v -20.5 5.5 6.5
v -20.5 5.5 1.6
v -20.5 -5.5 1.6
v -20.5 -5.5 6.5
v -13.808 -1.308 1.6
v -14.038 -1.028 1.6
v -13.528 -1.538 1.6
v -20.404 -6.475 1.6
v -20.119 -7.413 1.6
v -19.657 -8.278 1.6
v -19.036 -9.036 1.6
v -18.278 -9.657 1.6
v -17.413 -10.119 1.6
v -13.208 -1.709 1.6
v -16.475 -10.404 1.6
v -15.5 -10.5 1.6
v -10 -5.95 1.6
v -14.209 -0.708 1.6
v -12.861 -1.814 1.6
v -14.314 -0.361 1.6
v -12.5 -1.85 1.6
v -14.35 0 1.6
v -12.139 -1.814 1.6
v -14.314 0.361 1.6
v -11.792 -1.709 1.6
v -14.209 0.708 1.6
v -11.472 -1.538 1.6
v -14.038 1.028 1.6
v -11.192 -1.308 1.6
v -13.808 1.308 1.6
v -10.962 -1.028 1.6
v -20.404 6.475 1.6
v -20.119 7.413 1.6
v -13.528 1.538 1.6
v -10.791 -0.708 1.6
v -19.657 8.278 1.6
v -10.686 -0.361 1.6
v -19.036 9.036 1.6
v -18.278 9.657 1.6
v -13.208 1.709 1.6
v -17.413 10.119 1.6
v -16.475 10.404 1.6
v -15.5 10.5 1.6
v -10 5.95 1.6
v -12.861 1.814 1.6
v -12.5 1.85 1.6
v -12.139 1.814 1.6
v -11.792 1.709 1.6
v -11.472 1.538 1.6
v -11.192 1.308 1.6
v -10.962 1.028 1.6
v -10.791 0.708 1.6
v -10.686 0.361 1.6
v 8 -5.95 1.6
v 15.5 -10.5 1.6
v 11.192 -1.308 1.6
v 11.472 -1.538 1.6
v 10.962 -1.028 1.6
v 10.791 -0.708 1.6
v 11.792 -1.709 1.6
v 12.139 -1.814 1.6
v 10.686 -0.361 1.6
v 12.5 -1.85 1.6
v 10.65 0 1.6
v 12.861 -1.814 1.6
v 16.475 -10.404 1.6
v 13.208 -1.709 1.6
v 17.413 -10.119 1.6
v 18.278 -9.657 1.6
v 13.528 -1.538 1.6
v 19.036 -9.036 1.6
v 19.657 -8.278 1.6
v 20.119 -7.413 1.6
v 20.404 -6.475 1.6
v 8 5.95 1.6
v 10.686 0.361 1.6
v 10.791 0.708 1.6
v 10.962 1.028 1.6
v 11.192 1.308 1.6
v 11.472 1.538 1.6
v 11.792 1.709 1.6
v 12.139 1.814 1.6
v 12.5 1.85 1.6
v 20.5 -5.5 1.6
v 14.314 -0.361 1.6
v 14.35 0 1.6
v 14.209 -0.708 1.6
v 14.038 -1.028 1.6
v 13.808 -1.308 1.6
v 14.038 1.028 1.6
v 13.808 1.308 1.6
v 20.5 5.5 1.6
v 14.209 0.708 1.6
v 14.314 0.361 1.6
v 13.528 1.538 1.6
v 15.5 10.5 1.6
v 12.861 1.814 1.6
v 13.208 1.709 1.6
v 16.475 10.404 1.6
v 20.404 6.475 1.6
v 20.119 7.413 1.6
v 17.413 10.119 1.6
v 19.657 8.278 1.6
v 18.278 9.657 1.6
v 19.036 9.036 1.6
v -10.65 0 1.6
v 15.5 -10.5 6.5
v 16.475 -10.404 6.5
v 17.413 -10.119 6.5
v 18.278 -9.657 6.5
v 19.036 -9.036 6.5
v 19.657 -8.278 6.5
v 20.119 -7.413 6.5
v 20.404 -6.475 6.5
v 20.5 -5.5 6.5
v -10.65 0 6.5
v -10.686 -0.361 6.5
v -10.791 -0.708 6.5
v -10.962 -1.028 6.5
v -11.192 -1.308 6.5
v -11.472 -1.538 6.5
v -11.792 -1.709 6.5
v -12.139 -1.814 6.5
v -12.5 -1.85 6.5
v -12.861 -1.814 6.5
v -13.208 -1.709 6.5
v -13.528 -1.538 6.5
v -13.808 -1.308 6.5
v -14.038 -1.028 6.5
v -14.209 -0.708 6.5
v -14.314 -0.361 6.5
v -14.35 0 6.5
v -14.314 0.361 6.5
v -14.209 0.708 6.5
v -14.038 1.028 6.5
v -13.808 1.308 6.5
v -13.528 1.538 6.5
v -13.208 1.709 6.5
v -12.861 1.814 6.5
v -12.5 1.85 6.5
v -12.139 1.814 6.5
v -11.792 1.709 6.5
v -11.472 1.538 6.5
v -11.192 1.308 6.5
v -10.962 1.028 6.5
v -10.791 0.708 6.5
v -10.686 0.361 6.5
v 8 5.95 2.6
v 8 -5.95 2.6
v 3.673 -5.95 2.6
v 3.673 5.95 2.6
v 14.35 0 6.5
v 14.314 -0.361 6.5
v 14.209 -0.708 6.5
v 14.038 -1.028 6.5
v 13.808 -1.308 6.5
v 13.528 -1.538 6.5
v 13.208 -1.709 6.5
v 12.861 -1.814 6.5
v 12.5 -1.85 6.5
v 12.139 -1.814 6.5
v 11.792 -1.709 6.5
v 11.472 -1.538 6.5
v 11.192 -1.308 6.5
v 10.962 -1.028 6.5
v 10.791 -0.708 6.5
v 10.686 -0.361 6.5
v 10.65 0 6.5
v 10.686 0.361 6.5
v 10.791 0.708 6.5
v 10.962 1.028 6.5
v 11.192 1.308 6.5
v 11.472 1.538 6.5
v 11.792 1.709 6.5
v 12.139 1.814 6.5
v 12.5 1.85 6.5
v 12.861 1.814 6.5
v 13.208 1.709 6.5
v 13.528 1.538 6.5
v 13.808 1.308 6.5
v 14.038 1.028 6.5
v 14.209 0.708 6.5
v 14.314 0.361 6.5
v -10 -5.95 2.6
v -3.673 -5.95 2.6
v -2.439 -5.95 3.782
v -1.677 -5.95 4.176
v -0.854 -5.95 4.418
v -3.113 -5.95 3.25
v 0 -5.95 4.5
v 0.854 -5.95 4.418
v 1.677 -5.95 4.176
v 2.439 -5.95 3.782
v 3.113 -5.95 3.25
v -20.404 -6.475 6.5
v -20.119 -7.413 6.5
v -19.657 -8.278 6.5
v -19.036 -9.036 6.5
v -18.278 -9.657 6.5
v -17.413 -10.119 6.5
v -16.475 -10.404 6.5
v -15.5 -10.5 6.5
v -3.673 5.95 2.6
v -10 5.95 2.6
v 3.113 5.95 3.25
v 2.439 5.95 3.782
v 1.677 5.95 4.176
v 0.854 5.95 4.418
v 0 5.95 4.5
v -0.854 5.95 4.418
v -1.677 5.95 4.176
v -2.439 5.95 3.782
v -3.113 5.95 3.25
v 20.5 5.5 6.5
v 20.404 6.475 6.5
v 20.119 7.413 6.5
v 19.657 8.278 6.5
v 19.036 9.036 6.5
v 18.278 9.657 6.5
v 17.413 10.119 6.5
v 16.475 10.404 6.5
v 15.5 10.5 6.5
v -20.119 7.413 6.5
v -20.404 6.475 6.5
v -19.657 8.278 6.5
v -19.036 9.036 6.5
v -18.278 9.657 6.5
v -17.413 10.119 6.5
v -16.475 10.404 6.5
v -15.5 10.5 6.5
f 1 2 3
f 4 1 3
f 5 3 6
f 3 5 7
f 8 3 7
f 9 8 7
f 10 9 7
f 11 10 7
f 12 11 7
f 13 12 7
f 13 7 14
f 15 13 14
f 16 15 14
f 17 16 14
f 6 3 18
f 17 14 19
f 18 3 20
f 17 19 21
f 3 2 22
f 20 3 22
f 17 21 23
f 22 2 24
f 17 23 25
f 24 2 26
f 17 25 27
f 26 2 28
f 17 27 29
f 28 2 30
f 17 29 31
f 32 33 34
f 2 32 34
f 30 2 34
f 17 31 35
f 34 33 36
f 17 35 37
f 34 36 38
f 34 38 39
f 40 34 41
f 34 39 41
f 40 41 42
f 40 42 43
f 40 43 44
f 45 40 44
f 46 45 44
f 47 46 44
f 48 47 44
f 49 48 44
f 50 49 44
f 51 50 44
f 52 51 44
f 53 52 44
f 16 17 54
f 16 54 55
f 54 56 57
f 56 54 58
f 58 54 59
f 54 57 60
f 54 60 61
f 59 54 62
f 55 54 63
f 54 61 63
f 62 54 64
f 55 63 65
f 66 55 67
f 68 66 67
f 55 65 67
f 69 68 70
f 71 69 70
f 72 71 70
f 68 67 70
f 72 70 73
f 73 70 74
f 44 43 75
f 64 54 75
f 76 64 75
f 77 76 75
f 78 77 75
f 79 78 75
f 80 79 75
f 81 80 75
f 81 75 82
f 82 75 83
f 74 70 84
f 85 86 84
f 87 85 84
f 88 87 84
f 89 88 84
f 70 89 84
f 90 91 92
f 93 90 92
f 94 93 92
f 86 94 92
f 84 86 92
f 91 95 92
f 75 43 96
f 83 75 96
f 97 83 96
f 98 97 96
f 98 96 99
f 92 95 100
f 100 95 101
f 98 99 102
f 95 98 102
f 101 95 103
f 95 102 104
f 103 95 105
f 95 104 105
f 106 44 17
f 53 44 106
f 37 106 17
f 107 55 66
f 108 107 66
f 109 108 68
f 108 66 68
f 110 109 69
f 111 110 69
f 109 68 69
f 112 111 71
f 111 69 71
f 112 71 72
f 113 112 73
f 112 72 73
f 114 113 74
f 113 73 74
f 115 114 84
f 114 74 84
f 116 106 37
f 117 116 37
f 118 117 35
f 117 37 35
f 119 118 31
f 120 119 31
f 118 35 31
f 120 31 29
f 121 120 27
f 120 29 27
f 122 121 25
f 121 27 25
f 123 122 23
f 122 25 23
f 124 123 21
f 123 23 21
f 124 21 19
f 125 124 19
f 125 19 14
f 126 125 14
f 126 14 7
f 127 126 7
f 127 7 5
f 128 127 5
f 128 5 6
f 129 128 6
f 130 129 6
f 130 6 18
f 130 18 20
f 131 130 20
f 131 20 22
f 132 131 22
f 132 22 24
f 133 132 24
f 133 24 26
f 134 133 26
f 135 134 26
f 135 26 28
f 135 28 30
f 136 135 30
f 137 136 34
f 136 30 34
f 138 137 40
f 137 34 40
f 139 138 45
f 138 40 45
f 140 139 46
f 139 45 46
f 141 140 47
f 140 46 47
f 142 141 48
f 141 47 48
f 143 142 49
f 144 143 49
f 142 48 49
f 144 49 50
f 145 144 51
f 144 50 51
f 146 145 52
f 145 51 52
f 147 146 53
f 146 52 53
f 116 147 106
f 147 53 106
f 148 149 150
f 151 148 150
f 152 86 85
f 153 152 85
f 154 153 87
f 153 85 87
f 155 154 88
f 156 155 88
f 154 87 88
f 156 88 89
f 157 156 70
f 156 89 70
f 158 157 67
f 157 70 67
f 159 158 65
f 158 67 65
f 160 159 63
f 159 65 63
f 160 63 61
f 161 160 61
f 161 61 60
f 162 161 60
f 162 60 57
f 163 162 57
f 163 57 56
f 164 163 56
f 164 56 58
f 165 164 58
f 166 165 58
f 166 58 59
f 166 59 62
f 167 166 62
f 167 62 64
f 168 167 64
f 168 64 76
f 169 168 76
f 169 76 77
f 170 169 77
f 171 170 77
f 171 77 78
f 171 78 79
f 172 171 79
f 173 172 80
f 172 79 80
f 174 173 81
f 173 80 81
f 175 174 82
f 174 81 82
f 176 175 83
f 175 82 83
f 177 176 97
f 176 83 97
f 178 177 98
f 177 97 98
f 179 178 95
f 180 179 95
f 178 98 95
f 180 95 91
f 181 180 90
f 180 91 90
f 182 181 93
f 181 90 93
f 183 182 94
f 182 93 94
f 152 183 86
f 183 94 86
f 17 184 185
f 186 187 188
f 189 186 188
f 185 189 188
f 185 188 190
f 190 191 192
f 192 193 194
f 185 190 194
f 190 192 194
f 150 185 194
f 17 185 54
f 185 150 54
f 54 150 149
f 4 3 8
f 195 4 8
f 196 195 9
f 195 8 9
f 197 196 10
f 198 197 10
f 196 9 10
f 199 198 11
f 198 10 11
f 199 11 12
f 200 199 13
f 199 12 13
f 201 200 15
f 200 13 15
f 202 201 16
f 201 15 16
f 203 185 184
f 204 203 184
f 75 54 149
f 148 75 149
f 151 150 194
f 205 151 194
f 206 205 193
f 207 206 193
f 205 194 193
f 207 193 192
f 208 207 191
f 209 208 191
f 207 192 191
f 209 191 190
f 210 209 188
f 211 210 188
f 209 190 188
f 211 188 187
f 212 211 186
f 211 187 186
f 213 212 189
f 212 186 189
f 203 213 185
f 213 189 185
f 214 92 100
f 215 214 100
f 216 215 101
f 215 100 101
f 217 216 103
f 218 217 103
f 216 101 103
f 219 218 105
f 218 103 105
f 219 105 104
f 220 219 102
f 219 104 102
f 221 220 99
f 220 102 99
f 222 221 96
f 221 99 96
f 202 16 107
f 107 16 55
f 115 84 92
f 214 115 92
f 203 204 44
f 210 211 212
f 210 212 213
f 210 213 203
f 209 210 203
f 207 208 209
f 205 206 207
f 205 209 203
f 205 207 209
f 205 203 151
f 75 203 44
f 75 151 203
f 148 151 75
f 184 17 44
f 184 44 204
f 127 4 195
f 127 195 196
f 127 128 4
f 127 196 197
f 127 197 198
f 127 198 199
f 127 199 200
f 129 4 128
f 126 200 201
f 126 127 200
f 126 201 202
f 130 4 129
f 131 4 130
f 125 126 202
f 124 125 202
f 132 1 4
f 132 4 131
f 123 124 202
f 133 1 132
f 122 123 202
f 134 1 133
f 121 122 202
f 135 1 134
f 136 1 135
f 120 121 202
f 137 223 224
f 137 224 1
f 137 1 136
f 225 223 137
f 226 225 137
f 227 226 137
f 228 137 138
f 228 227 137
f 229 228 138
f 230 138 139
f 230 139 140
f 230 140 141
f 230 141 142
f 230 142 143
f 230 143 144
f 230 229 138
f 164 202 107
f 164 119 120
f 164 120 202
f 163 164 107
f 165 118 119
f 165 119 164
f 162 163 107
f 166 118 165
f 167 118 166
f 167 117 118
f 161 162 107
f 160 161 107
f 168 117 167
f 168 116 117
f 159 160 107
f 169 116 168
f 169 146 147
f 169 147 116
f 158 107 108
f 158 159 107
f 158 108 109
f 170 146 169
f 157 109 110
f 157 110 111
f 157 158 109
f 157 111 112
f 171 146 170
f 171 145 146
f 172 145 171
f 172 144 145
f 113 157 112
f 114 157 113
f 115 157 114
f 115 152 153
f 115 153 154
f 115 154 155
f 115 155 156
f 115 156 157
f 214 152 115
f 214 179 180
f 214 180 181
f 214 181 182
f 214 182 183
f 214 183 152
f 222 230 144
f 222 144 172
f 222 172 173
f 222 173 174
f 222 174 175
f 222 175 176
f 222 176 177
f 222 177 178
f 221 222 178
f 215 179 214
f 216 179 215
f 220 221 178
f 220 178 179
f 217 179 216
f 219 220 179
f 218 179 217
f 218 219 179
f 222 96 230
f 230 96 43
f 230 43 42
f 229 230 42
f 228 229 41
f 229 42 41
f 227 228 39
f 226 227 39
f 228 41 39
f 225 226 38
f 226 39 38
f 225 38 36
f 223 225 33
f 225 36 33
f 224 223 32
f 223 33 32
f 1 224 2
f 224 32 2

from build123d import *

# Parameters (mm, degrees)
F2_START = 1.6
F2_DEPTH = 4.9
F3_W     = 2
F3_H     = 5.2
F4_DEPTH = 5.95
F5_W     = 13
F5_H     = 3
F6_DEPTH = 12.5
F7_R     = 1.85
F8_DEPTH = 6


with BuildPart() as f2:
    # F1 (on Top) → F2 (new body)
    with BuildSketch(Plane.XY.offset(F2_START)):
        with BuildLine():
            ThreePointArc((20.5, 5.5), (19.0355339059, 9.0355339059), (15.5, 10.5))
            Line((15.5, 10.5), (-15.5, 10.5))
            ThreePointArc((-15.5, 10.5), (-19.0355339059, 9.0355339059), (-20.5, 5.5))
            Line((-20.5, 5.5), (-20.5, -5.5))
            ThreePointArc((-20.5, -5.5), (-19.0355339059, -9.0355339059), (-15.5, -10.5))
            Line((-15.5, -10.5), (15.5, -10.5))
            ThreePointArc((15.5, -10.5), (19.0355339059, -9.0355339059), (20.5, -5.5))
            Line((20.5, -5.5), (20.5, 5.5))
        make_face()
    extrude(amount=F2_DEPTH)

    # F3 (on Front) → F4 (cut, symmetric)
    with BuildSketch(Plane.XZ):
        with BuildLine():
            ThreePointArc((3.6728735344, -2.6), (4.2882357039, -1.3641974005), (4.5, 0))
            ThreePointArc((4.5, 0), (4.2882357039, 1.3641974005), (3.6728735344, 2.6))
            Line((3.6728735344, 2.6), (-3.6728735344, 2.6))
            ThreePointArc((-3.6728735344, 2.6), (-4.5, 0), (-3.6728735344, -2.6))
            Line((-3.6728735344, -2.6), (3.6728735344, -2.6))
        make_face()
        with BuildLine():
            ThreePointArc((3.6728735344, 2.6), (4.2882357039, 1.3641974005), (4.5, 0))
            ThreePointArc((4.5, 0), (4.2882357039, -1.3641974005), (3.6728735344, -2.6))
            Line((3.6728735344, -2.6), (8, -2.6))
            Line((8, -2.6), (8, 2.6))
            Line((8, 2.6), (3.6728735344, 2.6))
        make_face()
        with BuildLine():
            Line((-3.6728735344, 2.6), (3.6728735344, 2.6))
            ThreePointArc((3.6728735344, 2.6), (0, 4.5), (-3.6728735344, 2.6))
        make_face()
        with BuildLine():
            ThreePointArc((-3.6728735344, -2.6), (0, -4.5), (3.6728735344, -2.6))
            Line((3.6728735344, -2.6), (-3.6728735344, -2.6))
        make_face()
        with BuildLine():
            ThreePointArc((-3.6728735344, -2.6), (-4.5, 0), (-3.6728735344, 2.6))
            Line((-3.6728735344, 2.6), (-8, 2.6))
            Line((-8, 2.6), (-8, -2.6))
            Line((-8, -2.6), (-3.6728735344, -2.6))
        make_face()
        with Locations((-9, 0)):
            Rectangle(F3_W, F3_H)
    extrude(amount=F4_DEPTH, both=True, mode=Mode.SUBTRACT)

    # F5 (on Front) → F6 (cut, symmetric)
    with BuildSketch(Plane.XZ):
        Rectangle(F5_W, F5_H)
    extrude(amount=F6_DEPTH, both=True, mode=Mode.SUBTRACT)

    # F7 (on face) → F8 (cut)
    with BuildSketch(Plane(origin=(0, 0, 1.6), x_dir=(1, 0, 0), z_dir=(0, 0, -1))):
        with Locations((-12.5, 0)):
            Circle(F7_R)
        with Locations((12.5, 0)):
            Circle(F7_R)
    extrude(amount=-F8_DEPTH, mode=Mode.SUBTRACT)


solid = f2.part
